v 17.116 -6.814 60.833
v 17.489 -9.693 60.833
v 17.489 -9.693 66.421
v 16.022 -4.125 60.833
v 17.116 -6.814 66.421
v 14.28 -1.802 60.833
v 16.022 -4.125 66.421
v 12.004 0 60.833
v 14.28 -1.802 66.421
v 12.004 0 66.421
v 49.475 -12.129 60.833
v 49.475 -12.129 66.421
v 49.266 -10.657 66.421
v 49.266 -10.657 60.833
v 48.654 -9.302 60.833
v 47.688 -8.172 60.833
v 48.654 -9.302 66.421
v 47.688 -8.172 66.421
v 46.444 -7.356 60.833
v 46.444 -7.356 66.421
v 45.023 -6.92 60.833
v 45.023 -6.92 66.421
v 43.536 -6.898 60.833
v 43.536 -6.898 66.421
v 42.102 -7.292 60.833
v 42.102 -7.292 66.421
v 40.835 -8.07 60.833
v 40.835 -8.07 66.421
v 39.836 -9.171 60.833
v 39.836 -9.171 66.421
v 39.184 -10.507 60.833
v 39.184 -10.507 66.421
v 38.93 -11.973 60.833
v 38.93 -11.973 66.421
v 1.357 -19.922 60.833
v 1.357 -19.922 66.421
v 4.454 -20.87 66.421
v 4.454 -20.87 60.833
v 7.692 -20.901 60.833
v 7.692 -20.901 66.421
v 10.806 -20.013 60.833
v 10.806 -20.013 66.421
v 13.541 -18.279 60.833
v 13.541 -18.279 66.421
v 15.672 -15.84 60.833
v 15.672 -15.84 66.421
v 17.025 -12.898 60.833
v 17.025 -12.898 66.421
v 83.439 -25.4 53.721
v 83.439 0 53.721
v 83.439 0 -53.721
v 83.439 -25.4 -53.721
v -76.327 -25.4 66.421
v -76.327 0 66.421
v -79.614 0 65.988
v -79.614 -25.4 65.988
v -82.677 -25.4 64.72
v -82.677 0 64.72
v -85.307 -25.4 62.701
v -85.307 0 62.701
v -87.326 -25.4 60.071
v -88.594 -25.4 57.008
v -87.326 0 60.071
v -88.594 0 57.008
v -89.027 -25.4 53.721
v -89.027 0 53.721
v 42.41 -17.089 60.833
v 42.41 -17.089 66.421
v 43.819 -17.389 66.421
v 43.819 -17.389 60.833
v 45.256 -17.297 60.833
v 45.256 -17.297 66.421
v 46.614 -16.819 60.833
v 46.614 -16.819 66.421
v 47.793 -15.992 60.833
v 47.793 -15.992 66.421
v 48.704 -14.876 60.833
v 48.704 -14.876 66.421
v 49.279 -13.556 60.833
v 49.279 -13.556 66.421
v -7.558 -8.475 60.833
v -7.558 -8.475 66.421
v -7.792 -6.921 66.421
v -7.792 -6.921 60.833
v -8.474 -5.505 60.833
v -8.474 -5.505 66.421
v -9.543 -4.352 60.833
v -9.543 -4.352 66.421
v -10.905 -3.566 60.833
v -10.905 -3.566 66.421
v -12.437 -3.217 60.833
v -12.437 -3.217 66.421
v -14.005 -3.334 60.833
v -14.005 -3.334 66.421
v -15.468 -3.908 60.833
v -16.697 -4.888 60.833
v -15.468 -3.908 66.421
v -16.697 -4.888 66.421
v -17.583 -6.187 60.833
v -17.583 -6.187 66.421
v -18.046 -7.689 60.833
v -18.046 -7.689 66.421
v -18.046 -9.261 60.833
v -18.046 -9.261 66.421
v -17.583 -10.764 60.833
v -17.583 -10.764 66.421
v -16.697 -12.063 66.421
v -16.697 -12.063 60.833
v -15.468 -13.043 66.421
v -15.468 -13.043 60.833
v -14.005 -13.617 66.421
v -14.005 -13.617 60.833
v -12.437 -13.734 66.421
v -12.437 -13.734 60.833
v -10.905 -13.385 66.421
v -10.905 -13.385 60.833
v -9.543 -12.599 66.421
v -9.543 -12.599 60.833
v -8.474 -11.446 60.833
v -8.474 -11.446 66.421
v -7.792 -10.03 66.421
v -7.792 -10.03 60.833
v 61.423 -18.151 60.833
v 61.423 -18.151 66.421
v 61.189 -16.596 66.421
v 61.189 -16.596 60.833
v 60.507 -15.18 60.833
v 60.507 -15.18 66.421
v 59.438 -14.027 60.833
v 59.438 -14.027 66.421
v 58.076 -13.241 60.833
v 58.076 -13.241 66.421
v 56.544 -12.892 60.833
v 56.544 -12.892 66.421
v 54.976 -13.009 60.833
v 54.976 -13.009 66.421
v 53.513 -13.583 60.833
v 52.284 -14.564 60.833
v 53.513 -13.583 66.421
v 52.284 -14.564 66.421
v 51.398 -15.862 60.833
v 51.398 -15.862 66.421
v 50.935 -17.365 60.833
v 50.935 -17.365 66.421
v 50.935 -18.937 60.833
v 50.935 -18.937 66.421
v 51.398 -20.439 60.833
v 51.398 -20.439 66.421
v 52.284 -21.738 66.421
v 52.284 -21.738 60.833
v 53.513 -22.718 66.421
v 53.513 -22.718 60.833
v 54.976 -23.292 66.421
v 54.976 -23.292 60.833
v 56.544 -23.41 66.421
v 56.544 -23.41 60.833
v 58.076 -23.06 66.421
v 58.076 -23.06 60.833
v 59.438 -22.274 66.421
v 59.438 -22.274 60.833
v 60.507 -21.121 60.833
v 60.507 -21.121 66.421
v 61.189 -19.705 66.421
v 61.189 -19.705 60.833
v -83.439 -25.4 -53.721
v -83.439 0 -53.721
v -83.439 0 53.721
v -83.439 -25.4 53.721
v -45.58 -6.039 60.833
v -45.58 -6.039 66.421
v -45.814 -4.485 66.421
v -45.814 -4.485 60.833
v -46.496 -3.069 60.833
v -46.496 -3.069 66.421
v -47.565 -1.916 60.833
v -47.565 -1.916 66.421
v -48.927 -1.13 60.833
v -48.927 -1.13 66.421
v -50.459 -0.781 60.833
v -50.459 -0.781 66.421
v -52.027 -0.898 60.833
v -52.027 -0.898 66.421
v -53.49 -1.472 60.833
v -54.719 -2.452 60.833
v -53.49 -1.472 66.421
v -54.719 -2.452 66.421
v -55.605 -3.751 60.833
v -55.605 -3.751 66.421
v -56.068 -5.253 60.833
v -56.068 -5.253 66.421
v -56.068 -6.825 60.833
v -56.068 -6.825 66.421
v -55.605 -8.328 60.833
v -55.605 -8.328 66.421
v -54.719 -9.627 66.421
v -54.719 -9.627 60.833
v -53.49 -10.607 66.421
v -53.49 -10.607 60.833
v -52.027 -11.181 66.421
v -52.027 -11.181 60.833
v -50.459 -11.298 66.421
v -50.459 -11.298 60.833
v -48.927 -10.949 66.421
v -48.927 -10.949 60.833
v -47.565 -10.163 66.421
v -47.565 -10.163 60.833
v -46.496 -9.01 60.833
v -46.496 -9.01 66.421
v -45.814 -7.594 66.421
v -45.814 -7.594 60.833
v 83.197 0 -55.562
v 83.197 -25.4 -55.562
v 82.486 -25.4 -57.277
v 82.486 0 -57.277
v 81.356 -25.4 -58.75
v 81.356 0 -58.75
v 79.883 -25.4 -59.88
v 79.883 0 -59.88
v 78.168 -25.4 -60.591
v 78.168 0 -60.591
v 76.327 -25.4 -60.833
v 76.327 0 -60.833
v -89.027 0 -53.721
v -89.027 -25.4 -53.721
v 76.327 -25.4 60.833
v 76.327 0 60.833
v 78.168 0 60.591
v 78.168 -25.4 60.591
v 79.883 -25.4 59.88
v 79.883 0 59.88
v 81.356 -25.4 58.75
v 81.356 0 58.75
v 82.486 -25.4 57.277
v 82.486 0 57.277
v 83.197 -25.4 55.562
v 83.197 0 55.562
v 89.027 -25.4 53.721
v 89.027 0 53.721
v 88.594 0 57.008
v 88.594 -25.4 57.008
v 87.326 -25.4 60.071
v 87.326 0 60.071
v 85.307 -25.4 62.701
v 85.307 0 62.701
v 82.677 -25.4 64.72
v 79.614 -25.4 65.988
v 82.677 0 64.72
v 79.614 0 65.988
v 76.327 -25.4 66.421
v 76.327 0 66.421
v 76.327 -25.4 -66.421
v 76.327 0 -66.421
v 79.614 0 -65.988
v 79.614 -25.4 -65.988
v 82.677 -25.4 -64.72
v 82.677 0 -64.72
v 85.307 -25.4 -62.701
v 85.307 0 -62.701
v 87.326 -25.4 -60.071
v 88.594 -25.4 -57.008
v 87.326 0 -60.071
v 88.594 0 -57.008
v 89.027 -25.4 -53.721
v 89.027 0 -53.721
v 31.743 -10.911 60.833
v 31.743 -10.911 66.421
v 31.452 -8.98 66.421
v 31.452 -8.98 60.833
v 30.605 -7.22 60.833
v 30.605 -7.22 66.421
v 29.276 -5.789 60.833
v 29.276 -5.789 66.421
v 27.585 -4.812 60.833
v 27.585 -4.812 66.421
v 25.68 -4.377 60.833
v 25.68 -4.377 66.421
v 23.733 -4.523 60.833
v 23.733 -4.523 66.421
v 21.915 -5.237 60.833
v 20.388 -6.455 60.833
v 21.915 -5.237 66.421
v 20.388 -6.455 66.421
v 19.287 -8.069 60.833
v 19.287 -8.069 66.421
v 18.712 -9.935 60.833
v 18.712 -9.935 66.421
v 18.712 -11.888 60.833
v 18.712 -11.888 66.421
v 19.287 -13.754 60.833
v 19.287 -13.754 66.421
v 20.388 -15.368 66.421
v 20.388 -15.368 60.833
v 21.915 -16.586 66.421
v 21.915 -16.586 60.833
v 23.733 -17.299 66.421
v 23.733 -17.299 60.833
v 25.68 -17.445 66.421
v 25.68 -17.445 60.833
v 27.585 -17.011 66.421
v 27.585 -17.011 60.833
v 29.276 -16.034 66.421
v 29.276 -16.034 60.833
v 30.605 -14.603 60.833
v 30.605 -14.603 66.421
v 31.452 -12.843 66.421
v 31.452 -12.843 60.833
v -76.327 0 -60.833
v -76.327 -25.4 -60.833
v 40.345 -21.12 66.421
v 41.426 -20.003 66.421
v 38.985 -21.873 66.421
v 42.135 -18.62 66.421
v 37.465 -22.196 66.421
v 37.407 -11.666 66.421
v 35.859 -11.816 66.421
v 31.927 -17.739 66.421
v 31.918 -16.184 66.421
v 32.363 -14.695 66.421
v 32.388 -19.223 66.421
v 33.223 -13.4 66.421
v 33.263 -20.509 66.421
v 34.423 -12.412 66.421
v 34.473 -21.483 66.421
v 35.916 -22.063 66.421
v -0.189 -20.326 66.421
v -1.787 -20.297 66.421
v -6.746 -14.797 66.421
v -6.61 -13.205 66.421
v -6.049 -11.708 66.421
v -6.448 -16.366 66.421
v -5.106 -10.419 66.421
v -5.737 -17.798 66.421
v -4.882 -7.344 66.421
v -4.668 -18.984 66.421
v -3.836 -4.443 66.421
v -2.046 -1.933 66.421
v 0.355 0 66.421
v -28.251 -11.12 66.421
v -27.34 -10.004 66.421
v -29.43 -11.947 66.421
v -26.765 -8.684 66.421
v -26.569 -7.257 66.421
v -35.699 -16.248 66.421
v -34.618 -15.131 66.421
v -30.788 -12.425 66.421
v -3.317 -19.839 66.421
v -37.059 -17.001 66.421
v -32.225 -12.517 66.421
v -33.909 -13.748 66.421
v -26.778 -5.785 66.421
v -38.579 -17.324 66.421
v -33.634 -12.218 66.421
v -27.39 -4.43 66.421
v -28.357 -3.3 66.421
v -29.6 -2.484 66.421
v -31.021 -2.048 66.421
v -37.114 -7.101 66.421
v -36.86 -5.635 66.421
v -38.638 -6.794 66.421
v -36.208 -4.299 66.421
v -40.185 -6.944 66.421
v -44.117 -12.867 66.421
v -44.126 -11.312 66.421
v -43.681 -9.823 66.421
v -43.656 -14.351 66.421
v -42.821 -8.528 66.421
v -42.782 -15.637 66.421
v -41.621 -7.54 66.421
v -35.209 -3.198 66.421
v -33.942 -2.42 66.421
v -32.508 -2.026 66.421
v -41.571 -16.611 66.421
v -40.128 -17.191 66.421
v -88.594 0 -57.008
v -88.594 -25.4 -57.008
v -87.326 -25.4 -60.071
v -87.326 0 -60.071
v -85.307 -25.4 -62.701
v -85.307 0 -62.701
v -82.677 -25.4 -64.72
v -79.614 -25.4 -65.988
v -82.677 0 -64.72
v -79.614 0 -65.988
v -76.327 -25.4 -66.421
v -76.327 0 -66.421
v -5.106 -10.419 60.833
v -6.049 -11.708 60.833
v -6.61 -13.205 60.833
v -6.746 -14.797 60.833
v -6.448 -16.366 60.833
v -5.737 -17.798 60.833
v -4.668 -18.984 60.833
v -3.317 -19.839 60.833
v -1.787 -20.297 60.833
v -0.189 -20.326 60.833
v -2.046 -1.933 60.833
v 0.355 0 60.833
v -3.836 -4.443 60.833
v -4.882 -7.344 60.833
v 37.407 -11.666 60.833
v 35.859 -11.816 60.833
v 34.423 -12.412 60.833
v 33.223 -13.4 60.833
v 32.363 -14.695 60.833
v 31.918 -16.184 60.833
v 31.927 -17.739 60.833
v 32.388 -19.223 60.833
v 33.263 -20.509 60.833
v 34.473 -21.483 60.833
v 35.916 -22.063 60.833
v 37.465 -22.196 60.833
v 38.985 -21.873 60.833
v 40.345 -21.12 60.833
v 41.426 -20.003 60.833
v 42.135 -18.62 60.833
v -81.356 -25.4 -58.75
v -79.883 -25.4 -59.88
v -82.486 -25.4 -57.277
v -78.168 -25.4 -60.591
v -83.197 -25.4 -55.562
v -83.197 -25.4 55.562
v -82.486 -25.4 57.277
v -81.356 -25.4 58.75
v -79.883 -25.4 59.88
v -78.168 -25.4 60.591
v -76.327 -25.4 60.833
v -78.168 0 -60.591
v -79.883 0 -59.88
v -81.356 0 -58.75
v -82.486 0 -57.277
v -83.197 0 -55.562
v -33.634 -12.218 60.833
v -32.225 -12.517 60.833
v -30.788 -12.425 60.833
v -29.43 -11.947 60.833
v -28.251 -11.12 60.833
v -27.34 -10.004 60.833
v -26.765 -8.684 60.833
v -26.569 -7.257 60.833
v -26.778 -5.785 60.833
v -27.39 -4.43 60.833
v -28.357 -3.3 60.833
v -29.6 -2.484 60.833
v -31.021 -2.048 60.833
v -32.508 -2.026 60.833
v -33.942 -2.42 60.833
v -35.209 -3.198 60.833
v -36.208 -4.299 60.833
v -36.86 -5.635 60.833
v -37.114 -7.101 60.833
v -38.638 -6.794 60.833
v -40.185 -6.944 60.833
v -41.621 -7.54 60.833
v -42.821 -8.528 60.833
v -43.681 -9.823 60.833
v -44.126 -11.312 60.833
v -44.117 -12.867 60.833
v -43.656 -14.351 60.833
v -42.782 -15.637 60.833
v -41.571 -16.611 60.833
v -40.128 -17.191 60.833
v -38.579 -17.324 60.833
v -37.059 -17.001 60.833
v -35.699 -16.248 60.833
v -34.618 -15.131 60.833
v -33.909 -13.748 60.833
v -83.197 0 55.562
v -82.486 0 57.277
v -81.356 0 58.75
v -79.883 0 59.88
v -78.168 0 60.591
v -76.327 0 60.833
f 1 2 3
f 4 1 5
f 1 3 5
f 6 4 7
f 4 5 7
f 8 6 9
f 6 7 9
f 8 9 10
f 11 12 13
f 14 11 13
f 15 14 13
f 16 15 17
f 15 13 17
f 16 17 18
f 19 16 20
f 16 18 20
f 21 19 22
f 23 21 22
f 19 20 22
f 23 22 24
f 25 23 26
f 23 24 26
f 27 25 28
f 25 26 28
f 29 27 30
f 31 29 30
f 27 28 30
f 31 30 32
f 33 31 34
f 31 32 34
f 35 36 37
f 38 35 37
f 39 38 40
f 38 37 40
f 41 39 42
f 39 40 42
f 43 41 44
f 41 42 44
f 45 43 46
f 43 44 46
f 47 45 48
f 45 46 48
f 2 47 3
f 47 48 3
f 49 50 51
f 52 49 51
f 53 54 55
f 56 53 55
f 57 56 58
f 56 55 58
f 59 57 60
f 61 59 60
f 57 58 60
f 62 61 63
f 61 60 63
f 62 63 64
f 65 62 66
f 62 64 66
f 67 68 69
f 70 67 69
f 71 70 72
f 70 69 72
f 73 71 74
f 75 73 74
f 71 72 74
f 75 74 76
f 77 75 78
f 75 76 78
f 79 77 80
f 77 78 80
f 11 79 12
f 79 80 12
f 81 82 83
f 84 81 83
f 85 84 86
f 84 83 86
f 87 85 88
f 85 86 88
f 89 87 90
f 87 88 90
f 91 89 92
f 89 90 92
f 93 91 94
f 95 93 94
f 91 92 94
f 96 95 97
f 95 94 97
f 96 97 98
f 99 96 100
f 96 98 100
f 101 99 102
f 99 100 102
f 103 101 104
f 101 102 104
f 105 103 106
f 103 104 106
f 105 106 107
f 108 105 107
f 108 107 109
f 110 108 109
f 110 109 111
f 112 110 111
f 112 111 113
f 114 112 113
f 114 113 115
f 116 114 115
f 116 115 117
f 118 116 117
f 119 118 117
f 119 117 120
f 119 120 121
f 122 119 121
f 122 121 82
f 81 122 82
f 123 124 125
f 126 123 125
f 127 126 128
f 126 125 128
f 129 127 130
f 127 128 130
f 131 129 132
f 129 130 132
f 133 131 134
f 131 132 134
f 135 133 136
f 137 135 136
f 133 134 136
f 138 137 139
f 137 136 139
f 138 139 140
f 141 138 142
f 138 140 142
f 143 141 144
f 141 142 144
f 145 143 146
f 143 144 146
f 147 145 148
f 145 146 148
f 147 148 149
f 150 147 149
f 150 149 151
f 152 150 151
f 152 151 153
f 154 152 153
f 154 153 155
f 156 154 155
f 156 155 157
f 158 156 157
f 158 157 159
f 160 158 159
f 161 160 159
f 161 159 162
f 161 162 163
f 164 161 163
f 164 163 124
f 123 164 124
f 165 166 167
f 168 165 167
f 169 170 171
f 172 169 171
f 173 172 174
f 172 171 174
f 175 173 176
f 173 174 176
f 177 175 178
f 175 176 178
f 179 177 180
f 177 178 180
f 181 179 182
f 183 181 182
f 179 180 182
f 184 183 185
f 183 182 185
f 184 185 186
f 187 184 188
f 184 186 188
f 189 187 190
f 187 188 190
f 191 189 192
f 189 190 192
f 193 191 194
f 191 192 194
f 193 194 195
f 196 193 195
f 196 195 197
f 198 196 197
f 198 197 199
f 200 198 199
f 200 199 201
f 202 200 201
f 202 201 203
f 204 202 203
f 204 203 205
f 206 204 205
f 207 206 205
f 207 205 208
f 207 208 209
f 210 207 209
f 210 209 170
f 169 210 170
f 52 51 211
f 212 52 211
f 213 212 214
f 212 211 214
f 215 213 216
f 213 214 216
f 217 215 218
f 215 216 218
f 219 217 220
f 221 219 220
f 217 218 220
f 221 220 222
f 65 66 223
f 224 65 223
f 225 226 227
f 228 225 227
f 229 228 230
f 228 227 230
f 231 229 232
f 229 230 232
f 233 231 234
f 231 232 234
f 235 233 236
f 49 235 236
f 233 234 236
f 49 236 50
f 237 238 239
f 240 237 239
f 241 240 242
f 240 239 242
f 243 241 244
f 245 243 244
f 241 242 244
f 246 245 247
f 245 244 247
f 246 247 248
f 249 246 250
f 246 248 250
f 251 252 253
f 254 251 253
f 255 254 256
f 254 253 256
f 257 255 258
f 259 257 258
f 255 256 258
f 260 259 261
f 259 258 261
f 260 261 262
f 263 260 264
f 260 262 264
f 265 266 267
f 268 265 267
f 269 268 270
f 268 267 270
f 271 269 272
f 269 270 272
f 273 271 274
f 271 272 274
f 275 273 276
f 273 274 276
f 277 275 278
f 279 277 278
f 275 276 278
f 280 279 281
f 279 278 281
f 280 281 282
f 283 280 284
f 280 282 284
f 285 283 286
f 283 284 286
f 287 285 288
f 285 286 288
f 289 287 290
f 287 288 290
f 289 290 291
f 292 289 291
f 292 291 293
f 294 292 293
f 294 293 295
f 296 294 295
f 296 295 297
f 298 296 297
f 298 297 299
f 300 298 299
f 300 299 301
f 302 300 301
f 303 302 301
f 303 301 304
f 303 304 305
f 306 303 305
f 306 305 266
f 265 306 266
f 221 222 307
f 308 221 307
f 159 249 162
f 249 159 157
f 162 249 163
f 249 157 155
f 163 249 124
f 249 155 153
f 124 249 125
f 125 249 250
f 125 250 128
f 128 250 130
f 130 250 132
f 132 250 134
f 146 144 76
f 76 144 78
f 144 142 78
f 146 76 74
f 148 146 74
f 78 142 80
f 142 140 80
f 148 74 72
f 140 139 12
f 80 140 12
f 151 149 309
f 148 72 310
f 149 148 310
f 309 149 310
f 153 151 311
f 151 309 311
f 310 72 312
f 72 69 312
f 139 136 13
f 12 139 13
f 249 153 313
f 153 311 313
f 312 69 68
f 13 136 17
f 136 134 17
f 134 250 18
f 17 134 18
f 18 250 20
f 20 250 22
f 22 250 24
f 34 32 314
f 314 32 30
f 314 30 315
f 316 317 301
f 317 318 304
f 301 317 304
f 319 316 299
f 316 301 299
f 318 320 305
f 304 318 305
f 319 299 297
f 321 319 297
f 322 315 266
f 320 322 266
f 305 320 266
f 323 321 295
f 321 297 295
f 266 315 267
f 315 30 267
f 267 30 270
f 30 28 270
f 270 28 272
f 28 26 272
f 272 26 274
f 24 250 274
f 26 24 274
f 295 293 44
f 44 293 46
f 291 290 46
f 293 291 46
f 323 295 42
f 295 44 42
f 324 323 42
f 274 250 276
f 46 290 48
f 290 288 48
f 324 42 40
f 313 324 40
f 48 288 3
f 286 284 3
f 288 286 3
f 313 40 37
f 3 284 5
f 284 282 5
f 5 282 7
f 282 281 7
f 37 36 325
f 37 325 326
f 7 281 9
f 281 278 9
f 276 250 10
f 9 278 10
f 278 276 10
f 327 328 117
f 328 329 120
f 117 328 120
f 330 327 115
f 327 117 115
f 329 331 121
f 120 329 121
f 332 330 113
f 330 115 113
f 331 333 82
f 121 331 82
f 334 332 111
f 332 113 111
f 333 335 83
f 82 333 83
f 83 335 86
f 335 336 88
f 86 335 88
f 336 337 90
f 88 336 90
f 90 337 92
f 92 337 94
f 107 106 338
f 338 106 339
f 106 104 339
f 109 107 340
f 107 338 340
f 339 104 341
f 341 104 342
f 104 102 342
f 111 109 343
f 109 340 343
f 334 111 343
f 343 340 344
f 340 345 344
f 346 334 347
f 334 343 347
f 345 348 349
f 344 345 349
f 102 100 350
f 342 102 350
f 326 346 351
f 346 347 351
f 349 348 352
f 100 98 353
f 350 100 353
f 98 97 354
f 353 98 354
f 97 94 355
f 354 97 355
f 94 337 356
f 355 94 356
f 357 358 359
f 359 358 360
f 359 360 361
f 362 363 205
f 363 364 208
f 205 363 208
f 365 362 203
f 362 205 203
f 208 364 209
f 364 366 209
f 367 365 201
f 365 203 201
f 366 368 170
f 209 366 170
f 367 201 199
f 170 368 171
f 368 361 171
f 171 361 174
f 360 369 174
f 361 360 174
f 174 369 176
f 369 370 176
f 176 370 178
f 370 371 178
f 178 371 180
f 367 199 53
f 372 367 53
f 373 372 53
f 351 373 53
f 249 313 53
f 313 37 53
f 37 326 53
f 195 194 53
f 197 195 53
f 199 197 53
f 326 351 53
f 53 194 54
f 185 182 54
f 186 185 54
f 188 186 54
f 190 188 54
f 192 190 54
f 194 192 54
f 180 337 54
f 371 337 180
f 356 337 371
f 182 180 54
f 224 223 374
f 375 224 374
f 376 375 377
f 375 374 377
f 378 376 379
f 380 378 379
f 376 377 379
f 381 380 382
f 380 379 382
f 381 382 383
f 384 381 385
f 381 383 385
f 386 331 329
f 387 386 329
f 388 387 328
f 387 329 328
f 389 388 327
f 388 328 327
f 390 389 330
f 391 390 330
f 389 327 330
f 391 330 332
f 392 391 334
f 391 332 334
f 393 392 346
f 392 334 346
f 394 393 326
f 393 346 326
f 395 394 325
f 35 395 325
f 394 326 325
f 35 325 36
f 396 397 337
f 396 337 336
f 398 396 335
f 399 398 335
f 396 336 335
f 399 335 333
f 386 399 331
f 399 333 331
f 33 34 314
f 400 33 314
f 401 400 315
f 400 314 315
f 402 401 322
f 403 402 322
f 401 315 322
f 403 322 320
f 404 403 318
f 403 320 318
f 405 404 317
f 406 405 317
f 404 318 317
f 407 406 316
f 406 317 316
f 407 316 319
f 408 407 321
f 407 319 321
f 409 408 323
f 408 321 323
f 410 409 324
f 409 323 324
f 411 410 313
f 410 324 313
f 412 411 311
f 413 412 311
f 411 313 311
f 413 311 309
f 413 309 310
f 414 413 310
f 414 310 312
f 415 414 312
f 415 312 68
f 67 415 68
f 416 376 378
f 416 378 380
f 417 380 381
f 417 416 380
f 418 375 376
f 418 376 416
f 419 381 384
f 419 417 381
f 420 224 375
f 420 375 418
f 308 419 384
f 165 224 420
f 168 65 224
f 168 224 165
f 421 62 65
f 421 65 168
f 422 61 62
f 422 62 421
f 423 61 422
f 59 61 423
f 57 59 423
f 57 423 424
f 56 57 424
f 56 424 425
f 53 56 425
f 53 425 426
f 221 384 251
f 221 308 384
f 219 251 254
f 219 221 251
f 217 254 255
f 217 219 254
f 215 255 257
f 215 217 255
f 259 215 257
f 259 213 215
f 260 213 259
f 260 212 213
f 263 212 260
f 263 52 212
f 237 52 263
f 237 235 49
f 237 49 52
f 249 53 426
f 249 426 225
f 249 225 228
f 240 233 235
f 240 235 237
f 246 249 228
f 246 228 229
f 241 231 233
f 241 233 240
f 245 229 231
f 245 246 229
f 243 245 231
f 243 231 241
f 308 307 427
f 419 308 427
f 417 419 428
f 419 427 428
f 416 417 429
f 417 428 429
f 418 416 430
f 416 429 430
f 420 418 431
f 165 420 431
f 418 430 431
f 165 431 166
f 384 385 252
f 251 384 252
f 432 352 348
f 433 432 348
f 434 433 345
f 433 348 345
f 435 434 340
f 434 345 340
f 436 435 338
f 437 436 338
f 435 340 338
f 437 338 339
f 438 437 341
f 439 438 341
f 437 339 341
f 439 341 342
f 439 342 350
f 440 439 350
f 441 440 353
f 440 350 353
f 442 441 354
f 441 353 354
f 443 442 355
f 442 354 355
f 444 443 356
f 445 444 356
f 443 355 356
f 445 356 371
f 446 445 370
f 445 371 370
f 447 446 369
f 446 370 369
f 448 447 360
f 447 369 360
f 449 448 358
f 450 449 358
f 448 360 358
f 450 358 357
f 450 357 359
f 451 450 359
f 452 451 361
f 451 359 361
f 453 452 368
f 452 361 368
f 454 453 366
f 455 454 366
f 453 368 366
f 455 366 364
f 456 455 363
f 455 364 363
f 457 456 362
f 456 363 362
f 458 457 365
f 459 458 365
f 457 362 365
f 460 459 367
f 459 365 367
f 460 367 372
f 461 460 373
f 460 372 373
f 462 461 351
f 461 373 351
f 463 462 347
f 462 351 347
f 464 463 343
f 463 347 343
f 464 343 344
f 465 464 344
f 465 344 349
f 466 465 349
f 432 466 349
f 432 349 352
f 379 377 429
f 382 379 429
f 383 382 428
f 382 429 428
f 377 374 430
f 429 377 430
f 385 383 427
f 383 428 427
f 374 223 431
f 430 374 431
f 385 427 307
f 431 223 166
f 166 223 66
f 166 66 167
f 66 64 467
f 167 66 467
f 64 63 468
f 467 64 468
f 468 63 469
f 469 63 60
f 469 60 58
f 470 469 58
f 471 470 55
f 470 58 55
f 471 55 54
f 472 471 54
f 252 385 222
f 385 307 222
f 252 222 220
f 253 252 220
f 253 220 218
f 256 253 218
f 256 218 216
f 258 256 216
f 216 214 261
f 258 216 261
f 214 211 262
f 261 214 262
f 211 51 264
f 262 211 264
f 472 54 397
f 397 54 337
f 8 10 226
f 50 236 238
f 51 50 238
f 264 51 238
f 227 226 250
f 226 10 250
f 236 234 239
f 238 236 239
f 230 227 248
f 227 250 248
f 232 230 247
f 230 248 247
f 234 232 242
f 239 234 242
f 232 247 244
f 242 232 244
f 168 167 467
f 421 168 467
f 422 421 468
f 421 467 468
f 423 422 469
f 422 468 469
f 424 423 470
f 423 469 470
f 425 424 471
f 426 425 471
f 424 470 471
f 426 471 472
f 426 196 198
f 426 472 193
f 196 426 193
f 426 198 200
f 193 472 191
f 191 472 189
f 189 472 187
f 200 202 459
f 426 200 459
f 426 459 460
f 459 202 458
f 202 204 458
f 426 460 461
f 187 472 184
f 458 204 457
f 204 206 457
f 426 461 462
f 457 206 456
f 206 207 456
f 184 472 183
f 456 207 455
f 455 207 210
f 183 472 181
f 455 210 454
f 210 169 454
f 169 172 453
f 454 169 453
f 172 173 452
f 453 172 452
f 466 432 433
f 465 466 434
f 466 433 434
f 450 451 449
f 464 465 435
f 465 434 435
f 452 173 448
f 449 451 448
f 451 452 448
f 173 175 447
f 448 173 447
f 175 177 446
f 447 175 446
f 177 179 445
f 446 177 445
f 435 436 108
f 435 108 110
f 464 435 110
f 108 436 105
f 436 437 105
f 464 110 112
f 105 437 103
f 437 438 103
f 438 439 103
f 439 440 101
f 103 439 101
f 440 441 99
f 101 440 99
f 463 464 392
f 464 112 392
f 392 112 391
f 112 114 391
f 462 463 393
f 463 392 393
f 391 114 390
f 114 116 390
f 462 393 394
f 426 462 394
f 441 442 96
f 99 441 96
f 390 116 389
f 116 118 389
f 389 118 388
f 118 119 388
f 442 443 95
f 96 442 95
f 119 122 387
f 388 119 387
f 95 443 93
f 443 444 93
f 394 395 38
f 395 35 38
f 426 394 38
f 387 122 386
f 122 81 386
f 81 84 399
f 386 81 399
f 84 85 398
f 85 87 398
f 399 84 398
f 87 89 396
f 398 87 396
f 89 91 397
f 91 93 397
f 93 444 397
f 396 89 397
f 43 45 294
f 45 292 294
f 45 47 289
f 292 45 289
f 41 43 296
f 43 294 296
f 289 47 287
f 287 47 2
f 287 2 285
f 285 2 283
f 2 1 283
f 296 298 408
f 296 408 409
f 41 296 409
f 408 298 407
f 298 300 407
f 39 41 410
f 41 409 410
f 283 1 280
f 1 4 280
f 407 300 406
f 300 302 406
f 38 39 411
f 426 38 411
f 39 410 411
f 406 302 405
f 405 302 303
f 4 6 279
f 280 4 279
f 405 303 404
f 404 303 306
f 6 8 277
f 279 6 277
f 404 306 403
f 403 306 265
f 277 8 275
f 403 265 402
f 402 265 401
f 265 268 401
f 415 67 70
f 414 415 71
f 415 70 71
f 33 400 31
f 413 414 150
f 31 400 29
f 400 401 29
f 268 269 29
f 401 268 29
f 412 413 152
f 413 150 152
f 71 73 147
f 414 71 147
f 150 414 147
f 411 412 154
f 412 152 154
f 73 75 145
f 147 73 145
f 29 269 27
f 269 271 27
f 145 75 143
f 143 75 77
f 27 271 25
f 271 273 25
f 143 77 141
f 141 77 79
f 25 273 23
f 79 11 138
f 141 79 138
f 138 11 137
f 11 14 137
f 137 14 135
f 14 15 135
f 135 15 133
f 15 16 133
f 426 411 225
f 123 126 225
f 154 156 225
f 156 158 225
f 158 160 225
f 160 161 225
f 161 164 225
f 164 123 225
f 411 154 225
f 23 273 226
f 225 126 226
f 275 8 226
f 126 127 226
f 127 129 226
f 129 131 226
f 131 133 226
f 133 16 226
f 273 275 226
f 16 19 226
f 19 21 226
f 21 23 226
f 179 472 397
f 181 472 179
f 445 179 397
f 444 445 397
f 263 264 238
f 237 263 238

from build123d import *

# Parameters (mm, degrees)
F1_DEPTH = 25.4
F2_R     = 5.2737089528
F2_R_2   = 6.5522963842
F3_DEPTH = 25.4


with BuildPart() as f1:
    # F0 (on Front) → F1 (new body)
    with BuildSketch(Plane.XZ):
        with BuildLine():
            Line((76.3270024538, 66.4210021496), (-76.3270024538, 66.4210021496))
            ThreePointArc((-76.3270024538, 66.4210021496), (-85.3072585749, 62.7012582707), (-89.0270024538, 53.7210021496))
            Line((-89.0270024538, 53.7210021496), (-89.0270024538, -53.7210021496))
            ThreePointArc((-89.0270024538, -53.7210021496), (-85.3072585749, -62.7012582707), (-76.3270024538, -66.4210021496))
            Line((-76.3270024538, -66.4210021496), (76.3270024538, -66.4210021496))
            ThreePointArc((76.3270024538, -66.4210021496), (85.3072585749, -62.7012582707), (89.0270024538, -53.7210021496))
            Line((89.0270024538, -53.7210021496), (89.0270024538, 53.7210021496))
            ThreePointArc((89.0270024538, 53.7210021496), (85.3072585749, 62.7012582707), (76.3270024538, 66.4210021496))
        make_face()
        with BuildLine():
            ThreePointArc((-83.4389999509, 53.7210021496), (-81.3559441118, 58.7499438076), (-76.3270024538, 60.8329996467))
            Line((-76.3270024538, 60.8329996467), (76.3270024538, 60.8329996467))
            ThreePointArc((76.3270024538, 60.8329996467), (81.3559441118, 58.7499438076), (83.4389999509, 53.7210021496))
            Line((83.4389999509, 53.7210021496), (83.4389999509, -53.7210021496))
            ThreePointArc((83.4389999509, -53.7210021496), (81.3559441118, -58.7499438076), (76.3270024538, -60.8329996467))
            Line((76.3270024538, -60.8329996467), (-76.3270024538, -60.8329996467))
            ThreePointArc((-76.3270024538, -60.8329996467), (-81.3559441118, -58.7499438076), (-83.4389999509, -53.7210021496))
            Line((-83.4389999509, -53.7210021496), (-83.4389999509, 53.7210021496))
        make_face(mode=Mode.SUBTRACT)
    extrude(amount=F1_DEPTH)

    # F2 (on face) → F3 (cut)
    with BuildSketch(Plane.XY.offset(66.4210021496)):
        with BuildLine():
            ThreePointArc((42.4100935748, -17.0894959721), (47.2318985675, -16.44577233), (49.4754982548, -12.1294725306))
            ThreePointArc((49.4754982548, -12.1294725306), (44.2802383376, -6.8563470943), (38.9304142859, -11.9725918196))
            ThreePointArc((38.9304142859, -11.9725918196), (41.455018358, -13.9025059955), (42.4124275114, -16.932615261))
            ThreePointArc((42.4124275114, -16.932615261), (42.411843995, -17.0110642966), (42.4100935748, -17.0894959721))
        make_face()
        with BuildLine():
            ThreePointArc((42.4124275114, -16.932615261), (41.455018358, -13.9025059955), (38.9304142859, -11.9725918196))
            ThreePointArc((38.9304142859, -11.9725918196), (39.8408927075, -15.095039426), (42.4100935748, -17.0894959721))
            ThreePointArc((42.4100935748, -17.0894959721), (42.411843995, -17.0110642966), (42.4124275114, -16.932615261))
        make_face()
        with BuildLine():
            ThreePointArc((42.4100935748, -17.0894959721), (39.8408927075, -15.095039426), (38.9304142859, -11.9725918196))
            ThreePointArc((38.9304142859, -11.9725918196), (32.7778219642, -19.8981821563), (42.4100935748, -17.0894959721))
        make_face()
        with Locations((56.1497411863, -18.1506130663)):
            Circle(F2_R)
        with Locations((25.1907666744, -10.9114747254)):
            Circle(F2_R_2)
        with BuildLine():
            ThreePointArc((1.3571952178, -19.9224330682), (12.2357895359, -19.2440179583), (17.4885247542, -9.6934769201))
            ThreePointArc((17.4885247542, -9.6934769201), (5.8170049948, 1.6094847037), (-5.1057663145, -10.4185817197))
            ThreePointArc((-5.1057663145, -10.4185817197), (1.3158519799, -9.0539178543), (4.9868853689, -14.4966196505))
            ThreePointArc((4.9868853689, -14.4966196505), (3.9957986589, -17.7605935258), (1.3571952178, -19.9224330682))
        make_face()
        with BuildLine():
            ThreePointArc((4.9868853689, -14.4966196505), (1.3158519799, -9.0539178543), (-5.1057663145, -10.4185817197))
            ThreePointArc((-5.1057663145, -10.4185817197), (-3.1716296669, -16.052748164), (1.3571952178, -19.9224330682))
            ThreePointArc((1.3571952178, -19.9224330682), (3.9957986589, -17.7605935258), (4.9868853689, -14.4966196505))
        make_face()
        with BuildLine():
            ThreePointArc((1.3571952178, -19.9224330682), (-3.1716296669, -16.052748164), (-5.1057663145, -10.4185817197))
            ThreePointArc((-5.1057663145, -10.4185817197), (-5.7374792548, -17.7976183831), (1.3571952178, -19.9224330682))
        make_face()
        with Locations((-12.8312785807, -8.4754791148)):
            Circle(F2_R)
        with BuildLine():
            ThreePointArc((-33.6339969355, -12.217504751), (-28.8121919428, -11.5737811089), (-26.5685922555, -7.2574813095))
            ThreePointArc((-26.5685922555, -7.2574813095), (-31.7638521727, -1.9843558732), (-37.1136762245, -7.1006005985))
            ThreePointArc((-37.1136762245, -7.1006005985), (-34.5890721523, -9.0305147744), (-33.6316629989, -12.0606240399))
            ThreePointArc((-33.6316629989, -12.0606240399), (-33.6322465153, -12.1390730755), (-33.6339969355, -12.217504751))
        make_face()
        with BuildLine():
            ThreePointArc((-33.6316629989, -12.0606240399), (-34.5890721523, -9.0305147744), (-37.1136762245, -7.1006005985))
            ThreePointArc((-37.1136762245, -7.1006005985), (-36.2031978028, -10.2230482049), (-33.6339969355, -12.217504751))
            ThreePointArc((-33.6339969355, -12.217504751), (-33.6322465153, -12.1390730755), (-33.6316629989, -12.0606240399))
        make_face()
        with BuildLine():
            ThreePointArc((-33.6339969355, -12.217504751), (-36.2031978028, -10.2230482049), (-37.1136762245, -7.1006005985))
            ThreePointArc((-37.1136762245, -7.1006005985), (-43.2662685461, -15.0261909352), (-33.6339969355, -12.217504751))
        make_face()
        with Locations((-50.8533238359, -6.0394835043)):
            Circle(F2_R)
    extrude(amount=-F3_DEPTH, mode=Mode.SUBTRACT)


solid = f1.part
